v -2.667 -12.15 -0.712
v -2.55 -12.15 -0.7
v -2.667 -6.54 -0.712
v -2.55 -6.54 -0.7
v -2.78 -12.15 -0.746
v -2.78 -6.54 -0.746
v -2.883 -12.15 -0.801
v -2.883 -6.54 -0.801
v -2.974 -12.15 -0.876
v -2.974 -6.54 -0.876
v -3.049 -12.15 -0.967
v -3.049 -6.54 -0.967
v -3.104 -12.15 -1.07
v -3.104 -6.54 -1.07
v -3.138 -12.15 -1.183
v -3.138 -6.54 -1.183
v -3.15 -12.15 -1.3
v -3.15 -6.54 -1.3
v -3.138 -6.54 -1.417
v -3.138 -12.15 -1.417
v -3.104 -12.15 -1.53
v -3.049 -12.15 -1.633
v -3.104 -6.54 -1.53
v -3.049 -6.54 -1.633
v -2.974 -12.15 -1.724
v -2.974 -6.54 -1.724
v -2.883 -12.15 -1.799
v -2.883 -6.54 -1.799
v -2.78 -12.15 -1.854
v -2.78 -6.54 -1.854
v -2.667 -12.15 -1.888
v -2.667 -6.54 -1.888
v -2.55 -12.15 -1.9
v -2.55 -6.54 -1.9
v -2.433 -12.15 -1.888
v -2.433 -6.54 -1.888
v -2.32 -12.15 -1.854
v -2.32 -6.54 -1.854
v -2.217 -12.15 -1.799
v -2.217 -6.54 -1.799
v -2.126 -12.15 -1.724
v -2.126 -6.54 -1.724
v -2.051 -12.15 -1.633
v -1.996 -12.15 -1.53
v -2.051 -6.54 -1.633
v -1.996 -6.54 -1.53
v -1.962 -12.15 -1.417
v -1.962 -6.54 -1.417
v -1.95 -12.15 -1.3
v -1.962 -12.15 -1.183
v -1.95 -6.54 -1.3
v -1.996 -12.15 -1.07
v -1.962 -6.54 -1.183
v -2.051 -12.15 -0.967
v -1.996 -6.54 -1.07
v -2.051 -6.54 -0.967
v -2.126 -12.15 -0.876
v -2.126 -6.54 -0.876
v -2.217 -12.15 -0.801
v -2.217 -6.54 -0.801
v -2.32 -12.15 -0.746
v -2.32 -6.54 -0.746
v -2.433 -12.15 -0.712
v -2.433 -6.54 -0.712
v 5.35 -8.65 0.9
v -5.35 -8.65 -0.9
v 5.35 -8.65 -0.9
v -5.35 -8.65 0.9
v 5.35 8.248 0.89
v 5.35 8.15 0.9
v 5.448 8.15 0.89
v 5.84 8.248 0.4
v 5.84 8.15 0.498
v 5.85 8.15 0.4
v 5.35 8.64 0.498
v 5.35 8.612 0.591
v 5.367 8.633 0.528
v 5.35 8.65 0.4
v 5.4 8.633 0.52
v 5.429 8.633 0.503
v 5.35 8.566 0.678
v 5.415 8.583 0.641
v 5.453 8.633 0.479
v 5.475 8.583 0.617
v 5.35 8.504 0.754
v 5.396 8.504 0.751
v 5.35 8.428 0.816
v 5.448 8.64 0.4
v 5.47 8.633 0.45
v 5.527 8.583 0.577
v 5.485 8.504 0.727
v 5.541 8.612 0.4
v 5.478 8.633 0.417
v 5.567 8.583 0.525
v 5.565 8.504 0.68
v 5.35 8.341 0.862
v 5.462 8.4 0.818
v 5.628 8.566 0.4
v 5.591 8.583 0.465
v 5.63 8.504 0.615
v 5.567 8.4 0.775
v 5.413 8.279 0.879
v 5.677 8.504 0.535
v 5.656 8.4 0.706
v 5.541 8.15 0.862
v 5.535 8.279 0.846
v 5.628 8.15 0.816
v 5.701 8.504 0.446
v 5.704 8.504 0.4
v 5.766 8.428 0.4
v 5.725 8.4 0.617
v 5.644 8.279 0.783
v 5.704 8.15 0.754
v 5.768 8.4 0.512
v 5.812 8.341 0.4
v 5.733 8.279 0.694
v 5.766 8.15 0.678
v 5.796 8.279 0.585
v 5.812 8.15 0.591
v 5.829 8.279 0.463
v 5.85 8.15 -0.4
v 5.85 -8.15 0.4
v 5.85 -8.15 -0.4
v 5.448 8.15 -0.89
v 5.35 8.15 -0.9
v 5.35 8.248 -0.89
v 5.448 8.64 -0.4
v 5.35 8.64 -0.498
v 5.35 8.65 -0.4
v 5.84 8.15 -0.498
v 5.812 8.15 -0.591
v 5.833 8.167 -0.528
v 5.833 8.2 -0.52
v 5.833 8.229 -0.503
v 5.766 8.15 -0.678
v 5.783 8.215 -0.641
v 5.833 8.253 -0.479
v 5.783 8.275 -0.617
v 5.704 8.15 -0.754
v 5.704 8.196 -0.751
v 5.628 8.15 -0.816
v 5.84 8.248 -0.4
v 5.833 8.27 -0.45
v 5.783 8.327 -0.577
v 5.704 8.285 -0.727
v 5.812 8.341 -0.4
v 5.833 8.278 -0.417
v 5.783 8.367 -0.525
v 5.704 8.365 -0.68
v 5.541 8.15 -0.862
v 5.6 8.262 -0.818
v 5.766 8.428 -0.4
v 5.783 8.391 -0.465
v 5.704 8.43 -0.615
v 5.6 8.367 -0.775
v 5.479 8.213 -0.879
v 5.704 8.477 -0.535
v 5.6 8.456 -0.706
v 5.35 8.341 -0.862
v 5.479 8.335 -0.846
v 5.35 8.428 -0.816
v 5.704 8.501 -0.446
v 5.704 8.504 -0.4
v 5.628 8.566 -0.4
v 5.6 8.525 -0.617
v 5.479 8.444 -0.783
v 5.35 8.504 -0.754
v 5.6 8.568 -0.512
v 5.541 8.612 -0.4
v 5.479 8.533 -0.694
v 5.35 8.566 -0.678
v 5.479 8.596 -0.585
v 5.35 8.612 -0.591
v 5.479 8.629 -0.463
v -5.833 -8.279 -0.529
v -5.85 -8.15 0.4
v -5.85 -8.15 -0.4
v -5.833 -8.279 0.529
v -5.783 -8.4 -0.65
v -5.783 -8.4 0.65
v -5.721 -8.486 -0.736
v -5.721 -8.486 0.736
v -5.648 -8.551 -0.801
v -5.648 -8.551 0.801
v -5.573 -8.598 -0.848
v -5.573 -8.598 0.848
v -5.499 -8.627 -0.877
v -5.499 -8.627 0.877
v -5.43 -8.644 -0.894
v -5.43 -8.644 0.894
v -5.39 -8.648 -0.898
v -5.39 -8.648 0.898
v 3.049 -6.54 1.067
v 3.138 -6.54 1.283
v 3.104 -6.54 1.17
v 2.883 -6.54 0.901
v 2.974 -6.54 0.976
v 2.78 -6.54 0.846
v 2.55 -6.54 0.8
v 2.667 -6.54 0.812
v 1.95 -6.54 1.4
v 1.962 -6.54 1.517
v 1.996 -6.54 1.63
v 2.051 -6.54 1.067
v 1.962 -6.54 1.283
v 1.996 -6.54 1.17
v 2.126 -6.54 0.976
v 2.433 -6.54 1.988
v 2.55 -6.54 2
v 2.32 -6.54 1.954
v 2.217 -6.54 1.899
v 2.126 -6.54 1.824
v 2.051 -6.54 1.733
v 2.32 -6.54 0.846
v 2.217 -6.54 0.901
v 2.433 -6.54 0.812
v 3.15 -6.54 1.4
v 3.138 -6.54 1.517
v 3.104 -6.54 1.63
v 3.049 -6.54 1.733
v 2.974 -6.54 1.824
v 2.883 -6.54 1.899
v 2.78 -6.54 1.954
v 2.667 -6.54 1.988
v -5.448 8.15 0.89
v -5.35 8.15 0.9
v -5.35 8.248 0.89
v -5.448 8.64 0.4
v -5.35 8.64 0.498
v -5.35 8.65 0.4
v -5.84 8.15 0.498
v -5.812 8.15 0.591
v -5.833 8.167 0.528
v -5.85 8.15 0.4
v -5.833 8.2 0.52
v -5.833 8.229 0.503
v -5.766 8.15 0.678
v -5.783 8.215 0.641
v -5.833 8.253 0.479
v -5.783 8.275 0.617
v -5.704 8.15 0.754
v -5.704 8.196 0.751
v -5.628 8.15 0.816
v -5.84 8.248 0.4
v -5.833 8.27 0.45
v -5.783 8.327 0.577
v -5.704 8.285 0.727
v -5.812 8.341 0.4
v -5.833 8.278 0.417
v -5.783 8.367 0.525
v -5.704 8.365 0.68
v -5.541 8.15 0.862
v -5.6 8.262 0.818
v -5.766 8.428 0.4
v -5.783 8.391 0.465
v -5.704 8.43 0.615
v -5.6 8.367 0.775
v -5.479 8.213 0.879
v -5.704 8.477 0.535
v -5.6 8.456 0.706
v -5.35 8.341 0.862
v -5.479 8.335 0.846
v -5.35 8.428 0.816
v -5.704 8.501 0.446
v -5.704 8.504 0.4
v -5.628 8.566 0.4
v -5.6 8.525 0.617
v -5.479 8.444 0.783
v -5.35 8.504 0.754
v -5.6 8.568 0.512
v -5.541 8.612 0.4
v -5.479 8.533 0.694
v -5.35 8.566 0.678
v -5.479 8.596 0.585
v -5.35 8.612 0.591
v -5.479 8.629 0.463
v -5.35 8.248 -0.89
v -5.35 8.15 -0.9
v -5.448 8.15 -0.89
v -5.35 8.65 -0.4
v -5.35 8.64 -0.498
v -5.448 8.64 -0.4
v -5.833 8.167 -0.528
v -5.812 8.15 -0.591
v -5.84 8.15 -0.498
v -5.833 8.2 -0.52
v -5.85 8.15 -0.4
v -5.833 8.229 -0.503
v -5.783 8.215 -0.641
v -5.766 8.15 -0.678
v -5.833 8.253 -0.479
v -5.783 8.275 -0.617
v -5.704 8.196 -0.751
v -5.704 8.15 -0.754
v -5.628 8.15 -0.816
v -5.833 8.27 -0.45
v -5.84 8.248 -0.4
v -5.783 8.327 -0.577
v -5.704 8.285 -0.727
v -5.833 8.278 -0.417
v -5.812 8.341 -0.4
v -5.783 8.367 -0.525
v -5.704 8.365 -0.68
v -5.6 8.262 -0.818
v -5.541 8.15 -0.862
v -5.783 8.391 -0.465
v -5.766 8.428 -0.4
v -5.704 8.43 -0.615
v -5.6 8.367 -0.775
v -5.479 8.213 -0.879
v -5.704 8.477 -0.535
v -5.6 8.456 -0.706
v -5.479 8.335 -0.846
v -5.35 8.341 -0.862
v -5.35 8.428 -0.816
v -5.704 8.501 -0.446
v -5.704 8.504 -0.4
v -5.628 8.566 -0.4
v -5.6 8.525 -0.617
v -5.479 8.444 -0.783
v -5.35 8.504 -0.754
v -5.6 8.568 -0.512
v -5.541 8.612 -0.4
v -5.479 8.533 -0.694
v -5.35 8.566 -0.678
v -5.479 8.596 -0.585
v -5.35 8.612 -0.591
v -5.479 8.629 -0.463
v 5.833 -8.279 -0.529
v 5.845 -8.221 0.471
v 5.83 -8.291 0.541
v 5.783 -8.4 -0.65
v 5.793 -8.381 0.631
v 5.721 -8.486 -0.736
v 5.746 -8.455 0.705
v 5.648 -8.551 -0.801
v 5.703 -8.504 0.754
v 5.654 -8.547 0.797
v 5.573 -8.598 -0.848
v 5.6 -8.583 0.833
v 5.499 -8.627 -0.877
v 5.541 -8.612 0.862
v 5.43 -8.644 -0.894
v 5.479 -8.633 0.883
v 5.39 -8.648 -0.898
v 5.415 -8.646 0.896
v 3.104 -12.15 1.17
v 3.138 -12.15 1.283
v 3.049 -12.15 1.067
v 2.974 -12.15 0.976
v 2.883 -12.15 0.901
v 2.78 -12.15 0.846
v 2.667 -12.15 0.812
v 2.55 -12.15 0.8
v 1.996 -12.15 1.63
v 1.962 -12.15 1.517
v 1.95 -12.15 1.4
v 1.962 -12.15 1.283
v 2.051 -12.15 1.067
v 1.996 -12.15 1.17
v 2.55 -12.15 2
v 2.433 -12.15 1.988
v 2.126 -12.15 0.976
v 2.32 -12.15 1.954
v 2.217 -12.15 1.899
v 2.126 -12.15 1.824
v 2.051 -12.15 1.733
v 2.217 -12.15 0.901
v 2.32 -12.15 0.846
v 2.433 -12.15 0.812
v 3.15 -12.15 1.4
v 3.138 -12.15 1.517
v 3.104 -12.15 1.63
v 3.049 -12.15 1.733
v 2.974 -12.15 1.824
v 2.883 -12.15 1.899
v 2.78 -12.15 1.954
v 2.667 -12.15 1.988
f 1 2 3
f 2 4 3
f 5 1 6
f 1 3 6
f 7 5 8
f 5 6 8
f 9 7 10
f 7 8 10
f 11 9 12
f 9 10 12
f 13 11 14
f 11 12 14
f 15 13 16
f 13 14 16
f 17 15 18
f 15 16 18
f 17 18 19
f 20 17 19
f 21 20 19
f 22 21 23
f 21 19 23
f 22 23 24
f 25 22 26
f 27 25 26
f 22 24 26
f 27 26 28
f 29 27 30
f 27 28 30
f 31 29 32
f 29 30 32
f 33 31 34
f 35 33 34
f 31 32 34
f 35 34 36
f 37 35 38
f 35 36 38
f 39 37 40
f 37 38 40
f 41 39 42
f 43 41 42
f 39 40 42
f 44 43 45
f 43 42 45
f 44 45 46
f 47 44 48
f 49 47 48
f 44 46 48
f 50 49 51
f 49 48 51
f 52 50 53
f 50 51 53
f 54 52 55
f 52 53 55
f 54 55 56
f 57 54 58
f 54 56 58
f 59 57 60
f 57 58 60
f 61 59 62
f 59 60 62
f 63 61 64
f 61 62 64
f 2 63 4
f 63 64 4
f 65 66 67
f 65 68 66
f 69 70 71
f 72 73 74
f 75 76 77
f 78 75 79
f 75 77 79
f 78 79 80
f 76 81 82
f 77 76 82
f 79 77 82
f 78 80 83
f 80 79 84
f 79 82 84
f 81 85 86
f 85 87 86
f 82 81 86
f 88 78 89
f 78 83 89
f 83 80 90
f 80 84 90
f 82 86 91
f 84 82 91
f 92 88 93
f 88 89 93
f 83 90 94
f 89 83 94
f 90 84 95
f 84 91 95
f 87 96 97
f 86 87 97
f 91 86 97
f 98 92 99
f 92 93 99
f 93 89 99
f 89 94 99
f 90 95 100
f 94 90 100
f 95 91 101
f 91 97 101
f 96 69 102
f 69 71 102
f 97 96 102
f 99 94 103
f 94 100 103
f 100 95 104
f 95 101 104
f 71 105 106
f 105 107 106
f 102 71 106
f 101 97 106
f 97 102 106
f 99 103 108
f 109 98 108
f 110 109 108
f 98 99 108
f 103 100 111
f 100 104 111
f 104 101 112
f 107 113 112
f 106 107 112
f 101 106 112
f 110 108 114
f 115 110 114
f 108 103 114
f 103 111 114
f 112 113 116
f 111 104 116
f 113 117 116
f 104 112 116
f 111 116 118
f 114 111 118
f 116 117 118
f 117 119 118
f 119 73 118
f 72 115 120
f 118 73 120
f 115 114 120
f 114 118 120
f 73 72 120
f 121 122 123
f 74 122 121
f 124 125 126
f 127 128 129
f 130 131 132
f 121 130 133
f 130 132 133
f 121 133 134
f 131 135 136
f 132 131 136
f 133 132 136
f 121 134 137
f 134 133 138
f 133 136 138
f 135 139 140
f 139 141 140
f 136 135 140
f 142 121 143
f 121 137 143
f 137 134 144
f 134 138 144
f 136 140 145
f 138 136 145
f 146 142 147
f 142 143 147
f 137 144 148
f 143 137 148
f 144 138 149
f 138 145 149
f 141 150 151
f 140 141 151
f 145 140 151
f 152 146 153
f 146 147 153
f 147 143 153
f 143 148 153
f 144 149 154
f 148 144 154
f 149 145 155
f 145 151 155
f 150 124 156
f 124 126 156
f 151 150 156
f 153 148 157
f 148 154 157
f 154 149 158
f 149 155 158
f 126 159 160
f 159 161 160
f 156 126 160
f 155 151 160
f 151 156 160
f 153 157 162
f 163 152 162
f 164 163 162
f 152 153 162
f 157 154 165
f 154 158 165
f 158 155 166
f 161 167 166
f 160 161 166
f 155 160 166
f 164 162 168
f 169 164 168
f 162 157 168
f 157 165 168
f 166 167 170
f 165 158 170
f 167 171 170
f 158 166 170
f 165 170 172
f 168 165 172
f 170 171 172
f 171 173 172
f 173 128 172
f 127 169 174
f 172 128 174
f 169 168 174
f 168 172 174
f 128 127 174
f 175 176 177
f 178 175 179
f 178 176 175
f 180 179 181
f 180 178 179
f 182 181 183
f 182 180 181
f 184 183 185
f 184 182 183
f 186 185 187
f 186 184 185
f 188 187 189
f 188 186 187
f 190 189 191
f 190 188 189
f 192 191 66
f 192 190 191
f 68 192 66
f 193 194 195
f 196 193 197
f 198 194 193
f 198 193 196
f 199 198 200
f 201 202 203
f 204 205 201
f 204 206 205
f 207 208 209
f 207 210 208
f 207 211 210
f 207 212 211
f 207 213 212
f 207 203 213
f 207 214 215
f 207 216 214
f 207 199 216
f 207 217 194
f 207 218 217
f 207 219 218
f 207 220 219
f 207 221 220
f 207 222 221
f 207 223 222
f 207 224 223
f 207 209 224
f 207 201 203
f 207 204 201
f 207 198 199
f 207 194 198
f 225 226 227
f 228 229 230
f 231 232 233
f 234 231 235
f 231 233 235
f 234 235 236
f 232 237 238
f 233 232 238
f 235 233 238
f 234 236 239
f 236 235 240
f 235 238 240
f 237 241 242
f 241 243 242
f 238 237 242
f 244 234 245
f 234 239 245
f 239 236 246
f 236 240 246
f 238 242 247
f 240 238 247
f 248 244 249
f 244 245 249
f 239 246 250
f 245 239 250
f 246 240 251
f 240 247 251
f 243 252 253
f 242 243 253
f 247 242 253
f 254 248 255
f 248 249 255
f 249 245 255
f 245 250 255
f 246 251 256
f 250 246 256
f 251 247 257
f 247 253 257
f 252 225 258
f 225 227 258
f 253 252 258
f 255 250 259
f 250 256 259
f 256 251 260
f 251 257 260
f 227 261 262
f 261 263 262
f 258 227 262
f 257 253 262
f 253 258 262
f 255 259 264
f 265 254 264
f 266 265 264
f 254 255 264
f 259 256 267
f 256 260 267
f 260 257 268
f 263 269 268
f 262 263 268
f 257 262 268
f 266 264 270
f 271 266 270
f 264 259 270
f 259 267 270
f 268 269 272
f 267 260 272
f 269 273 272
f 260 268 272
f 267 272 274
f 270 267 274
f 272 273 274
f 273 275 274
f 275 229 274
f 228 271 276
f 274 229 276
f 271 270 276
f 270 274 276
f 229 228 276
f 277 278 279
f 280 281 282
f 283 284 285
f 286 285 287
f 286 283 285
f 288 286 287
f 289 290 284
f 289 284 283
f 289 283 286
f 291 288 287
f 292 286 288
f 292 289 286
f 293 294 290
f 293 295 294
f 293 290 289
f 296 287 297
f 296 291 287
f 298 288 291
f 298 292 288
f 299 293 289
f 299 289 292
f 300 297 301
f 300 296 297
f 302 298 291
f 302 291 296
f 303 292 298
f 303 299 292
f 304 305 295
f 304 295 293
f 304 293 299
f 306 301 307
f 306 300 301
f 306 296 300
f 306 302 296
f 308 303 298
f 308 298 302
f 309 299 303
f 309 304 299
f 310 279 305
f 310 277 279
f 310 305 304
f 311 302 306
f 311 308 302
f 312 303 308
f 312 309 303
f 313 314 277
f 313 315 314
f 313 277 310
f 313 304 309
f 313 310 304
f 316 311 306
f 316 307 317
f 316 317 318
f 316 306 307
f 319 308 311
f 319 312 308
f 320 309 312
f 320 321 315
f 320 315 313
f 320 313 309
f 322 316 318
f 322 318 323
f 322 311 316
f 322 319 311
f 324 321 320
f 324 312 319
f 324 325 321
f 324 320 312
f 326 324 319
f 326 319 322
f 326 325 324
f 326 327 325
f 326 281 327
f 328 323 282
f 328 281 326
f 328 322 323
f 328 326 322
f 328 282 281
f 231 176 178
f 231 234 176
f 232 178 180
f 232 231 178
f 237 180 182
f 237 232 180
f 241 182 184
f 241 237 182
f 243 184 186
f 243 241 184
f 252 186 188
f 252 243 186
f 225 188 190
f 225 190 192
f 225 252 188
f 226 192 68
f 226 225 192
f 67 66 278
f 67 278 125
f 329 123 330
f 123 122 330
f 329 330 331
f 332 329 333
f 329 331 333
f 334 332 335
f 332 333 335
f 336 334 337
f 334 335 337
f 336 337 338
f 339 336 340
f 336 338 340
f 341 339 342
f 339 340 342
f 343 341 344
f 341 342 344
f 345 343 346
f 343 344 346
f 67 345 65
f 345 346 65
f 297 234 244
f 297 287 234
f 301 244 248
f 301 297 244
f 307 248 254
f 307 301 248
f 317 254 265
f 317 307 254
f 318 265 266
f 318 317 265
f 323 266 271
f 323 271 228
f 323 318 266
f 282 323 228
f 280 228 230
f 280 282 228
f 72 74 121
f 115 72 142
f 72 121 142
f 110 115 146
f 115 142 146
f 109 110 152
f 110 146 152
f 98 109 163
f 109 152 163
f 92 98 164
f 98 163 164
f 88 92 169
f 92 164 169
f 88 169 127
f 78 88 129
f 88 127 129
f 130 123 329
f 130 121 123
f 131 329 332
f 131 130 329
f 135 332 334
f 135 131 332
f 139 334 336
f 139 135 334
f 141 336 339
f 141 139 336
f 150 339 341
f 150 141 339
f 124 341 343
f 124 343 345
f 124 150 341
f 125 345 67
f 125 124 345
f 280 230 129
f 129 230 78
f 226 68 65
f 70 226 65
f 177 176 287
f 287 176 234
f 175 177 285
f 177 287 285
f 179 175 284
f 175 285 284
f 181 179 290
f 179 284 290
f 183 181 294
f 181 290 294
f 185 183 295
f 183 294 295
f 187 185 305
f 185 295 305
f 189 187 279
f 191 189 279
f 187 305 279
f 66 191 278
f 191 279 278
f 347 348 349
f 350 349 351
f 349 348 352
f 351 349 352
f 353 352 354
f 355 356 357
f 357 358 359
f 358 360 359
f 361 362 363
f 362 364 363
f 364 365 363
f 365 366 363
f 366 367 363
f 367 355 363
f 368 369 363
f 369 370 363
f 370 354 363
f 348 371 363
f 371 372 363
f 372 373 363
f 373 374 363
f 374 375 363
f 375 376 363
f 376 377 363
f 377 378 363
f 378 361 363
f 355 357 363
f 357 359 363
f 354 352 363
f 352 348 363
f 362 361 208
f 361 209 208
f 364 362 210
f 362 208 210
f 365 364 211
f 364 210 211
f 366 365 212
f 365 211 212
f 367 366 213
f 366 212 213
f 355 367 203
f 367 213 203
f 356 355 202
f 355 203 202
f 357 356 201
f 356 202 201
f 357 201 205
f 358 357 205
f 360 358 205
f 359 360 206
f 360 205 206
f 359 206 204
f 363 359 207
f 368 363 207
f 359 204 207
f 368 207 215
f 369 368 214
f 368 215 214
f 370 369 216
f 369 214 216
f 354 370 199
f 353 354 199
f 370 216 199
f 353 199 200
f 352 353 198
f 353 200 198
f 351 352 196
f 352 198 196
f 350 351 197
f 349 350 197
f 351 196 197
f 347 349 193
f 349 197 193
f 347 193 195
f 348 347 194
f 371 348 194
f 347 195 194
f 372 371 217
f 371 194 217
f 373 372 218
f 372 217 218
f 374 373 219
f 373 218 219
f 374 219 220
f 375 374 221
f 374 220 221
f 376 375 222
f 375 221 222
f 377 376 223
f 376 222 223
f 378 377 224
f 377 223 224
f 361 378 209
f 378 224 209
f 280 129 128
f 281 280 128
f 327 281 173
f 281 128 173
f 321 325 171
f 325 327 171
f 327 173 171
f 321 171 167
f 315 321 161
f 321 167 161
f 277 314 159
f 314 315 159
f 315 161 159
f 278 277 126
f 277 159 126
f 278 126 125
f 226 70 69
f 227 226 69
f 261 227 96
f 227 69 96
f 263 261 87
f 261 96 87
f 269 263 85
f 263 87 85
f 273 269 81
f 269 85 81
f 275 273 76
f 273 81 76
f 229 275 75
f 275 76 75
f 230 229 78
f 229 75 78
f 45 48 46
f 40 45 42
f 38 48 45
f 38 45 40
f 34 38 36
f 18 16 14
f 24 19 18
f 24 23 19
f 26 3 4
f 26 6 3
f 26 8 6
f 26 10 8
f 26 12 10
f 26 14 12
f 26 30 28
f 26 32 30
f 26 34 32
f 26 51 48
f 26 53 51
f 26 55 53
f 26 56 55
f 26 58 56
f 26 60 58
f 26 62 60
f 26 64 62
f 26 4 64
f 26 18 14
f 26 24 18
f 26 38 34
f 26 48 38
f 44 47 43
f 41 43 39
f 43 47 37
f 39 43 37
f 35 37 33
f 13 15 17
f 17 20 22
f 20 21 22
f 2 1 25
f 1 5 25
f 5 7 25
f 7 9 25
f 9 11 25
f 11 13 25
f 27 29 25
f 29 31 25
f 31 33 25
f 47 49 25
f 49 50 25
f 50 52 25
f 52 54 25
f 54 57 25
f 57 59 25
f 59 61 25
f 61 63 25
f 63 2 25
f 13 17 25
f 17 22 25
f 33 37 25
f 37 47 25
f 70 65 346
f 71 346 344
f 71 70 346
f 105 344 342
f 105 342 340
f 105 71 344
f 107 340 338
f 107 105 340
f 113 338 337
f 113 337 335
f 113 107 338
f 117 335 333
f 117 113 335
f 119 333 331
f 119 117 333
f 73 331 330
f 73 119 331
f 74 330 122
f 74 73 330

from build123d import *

# Parameters (mm, degrees)
SKETCH_1_W      = 11.7
SKETCH_1_H      = 17.3
EXTRUDE_1_DEPTH = 0.9
FILLET_1_R      = 0.5
SKETCH_3_W      = 0.6
SKETCH_3_H      = 5.609535621


with BuildPart() as part:
    # Эскиз1 → Бобышка-Вытянуть1 (new, symmetric)
    with BuildSketch(Plane.XY):
        Rectangle(SKETCH_1_W, SKETCH_1_H)
    extrude(amount=EXTRUDE_1_DEPTH, both=True)

    # Скругление1
    fillet_1_edges = [part.edges().sort_by_distance(p)[0] for p in [
        (5.85, 0, 0.9),
        (0, 8.65, 0.9),
        (-5.85, 0, 0.9),
        (0, 8.65, -0.9),
        (5.85, 0, -0.9),
        (-5.85, 0, -0.9),
        (-5.85, 8.65, 0),
        (5.85, 8.65, 0),
        (5.85, -8.65, 0),
        (-5.85, -8.65, 0),
    ]]
    fillet(fillet_1_edges, radius=FILLET_1_R)


with BuildPart() as body_2:
    # Эскиз3 → Повернуть2 (revolve)
    with BuildSketch(Plane(origin=(2.55, 0, 0), x_dir=(0, 0, -1), z_dir=(1, 0, 0)), mode=Mode.PRIVATE) as revolve_2_sk:
        with Locations((-1.1, -9.34523219)):
            Rectangle(SKETCH_3_W, SKETCH_3_H)
    revolve(revolve_2_sk.sketch.rotate(Axis((2.55, -2.222678483, 1.4), (0, -1, 0)), 180), axis=Axis((2.55, -2.222678483, 1.4), (0, -1, 0)))


with BuildPart() as body_3:
    # Move Body 1: copy of body 2
    add(body_2.part.moved(Location((-5.1, 0, -2.7))))


solid = Compound([part.part, body_2.part, body_3.part])
